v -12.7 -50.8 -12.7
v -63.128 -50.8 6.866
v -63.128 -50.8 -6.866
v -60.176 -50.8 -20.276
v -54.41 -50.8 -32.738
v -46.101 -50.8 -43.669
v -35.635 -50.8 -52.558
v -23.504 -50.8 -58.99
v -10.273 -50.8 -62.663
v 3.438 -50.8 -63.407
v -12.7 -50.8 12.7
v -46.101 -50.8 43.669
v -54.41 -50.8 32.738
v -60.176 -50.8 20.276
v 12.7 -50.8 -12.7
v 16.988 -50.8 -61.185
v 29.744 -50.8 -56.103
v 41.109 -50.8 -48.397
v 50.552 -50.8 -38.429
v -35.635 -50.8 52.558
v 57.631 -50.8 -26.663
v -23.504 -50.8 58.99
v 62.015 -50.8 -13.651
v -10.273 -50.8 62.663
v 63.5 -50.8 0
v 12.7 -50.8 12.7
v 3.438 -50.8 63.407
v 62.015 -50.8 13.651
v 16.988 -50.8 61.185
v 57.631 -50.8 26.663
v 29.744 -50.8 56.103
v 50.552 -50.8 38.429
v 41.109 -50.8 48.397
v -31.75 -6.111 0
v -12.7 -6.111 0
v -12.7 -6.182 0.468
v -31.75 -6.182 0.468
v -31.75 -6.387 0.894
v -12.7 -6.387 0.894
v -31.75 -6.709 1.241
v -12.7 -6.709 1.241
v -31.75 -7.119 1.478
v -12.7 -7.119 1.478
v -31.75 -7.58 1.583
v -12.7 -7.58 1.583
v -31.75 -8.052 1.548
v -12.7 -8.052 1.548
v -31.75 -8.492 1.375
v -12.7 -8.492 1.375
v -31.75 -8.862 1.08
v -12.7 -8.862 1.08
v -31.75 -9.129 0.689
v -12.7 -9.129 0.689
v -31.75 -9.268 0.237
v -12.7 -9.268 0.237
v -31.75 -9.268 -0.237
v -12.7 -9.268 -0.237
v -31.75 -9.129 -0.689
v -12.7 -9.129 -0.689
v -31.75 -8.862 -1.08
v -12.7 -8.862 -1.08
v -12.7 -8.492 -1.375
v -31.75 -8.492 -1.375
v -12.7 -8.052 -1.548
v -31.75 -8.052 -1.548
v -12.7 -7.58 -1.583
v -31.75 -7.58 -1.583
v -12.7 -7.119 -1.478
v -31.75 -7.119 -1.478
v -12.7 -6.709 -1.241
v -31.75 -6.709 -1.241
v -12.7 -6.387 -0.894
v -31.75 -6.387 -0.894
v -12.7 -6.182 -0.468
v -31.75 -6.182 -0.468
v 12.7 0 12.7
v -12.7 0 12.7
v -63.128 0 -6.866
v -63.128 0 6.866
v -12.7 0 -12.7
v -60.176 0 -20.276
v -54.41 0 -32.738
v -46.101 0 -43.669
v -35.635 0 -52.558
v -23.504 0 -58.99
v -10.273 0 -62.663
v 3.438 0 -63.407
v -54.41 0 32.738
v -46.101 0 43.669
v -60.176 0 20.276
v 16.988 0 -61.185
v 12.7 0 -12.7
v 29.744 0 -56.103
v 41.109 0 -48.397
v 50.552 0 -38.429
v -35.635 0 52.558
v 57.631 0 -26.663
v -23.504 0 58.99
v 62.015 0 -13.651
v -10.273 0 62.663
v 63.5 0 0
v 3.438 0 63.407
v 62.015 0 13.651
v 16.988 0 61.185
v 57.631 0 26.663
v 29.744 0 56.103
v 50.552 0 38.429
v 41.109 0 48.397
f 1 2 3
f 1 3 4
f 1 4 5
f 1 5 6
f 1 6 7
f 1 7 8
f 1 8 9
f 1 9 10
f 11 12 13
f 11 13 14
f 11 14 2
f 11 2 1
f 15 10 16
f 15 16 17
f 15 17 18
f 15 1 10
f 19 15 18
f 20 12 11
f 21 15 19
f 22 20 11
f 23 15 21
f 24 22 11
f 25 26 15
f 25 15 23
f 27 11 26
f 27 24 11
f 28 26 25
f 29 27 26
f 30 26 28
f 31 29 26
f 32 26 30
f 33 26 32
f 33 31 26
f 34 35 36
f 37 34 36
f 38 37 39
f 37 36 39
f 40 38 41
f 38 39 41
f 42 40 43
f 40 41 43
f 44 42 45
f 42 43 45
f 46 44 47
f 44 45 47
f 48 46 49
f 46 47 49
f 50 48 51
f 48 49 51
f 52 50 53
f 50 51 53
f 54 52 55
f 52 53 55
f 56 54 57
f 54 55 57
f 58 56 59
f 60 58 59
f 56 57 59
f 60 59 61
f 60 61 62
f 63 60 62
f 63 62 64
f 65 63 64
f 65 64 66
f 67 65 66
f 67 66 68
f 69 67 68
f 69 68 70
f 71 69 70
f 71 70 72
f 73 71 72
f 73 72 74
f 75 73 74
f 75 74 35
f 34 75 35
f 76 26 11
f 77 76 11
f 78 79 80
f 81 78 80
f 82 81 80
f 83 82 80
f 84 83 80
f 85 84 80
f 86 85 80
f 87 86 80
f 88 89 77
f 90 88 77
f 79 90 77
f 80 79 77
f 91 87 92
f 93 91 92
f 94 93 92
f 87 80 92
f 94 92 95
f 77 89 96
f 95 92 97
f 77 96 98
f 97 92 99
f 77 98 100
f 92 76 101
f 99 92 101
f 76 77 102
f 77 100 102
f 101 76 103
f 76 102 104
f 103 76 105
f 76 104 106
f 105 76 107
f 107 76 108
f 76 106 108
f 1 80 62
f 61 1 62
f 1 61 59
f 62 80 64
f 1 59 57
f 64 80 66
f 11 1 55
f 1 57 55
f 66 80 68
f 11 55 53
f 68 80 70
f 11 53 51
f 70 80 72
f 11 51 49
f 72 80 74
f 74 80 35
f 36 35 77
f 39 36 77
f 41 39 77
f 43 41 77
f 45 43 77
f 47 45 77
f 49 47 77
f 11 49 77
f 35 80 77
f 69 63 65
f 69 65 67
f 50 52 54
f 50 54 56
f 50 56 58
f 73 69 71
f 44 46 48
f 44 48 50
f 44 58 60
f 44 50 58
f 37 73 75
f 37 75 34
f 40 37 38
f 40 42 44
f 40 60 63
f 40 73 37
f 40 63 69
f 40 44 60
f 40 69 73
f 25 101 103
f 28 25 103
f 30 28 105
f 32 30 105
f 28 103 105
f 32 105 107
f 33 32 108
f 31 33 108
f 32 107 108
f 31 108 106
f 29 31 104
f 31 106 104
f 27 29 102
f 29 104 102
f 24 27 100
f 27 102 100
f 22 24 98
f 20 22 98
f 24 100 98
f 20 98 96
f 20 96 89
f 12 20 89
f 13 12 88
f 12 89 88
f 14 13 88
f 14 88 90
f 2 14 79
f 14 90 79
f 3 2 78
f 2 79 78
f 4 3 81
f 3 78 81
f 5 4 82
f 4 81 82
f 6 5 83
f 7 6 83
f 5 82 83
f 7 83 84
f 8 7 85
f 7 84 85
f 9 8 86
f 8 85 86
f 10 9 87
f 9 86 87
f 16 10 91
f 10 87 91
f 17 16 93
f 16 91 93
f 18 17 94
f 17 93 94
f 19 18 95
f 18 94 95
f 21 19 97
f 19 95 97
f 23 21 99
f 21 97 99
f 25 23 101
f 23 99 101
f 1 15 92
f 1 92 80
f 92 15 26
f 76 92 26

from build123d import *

# Parameters (mm, degrees)
F0_R     = 63.5
F1_DEPTH = 50.8
F2_W     = 25.4
F2_H     = 25.4
F3_DEPTH = 50.8
F4_R     = 1.5875
F5_DEPTH = 31.75


with BuildPart() as f1:
    # F0 (on Front) → F1 (new body)
    with BuildSketch(Plane.XZ):
        Circle(F0_R)
    extrude(amount=F1_DEPTH)

    # F2 (on face) → F3 (cut)
    with BuildSketch(Plane(origin=(0, 0, 0), x_dir=(-1, 0, 0), z_dir=(0, 1, 0))):
        Rectangle(F2_W, F2_H)
    extrude(amount=-F3_DEPTH, mode=Mode.SUBTRACT)

    # F4 (on Right) → F5 (cut)
    with BuildSketch(Plane.YZ):
        with Locations((-7.698557, 0)):
            Circle(F4_R)
    extrude(amount=-F5_DEPTH, mode=Mode.SUBTRACT)


solid = f1.part
